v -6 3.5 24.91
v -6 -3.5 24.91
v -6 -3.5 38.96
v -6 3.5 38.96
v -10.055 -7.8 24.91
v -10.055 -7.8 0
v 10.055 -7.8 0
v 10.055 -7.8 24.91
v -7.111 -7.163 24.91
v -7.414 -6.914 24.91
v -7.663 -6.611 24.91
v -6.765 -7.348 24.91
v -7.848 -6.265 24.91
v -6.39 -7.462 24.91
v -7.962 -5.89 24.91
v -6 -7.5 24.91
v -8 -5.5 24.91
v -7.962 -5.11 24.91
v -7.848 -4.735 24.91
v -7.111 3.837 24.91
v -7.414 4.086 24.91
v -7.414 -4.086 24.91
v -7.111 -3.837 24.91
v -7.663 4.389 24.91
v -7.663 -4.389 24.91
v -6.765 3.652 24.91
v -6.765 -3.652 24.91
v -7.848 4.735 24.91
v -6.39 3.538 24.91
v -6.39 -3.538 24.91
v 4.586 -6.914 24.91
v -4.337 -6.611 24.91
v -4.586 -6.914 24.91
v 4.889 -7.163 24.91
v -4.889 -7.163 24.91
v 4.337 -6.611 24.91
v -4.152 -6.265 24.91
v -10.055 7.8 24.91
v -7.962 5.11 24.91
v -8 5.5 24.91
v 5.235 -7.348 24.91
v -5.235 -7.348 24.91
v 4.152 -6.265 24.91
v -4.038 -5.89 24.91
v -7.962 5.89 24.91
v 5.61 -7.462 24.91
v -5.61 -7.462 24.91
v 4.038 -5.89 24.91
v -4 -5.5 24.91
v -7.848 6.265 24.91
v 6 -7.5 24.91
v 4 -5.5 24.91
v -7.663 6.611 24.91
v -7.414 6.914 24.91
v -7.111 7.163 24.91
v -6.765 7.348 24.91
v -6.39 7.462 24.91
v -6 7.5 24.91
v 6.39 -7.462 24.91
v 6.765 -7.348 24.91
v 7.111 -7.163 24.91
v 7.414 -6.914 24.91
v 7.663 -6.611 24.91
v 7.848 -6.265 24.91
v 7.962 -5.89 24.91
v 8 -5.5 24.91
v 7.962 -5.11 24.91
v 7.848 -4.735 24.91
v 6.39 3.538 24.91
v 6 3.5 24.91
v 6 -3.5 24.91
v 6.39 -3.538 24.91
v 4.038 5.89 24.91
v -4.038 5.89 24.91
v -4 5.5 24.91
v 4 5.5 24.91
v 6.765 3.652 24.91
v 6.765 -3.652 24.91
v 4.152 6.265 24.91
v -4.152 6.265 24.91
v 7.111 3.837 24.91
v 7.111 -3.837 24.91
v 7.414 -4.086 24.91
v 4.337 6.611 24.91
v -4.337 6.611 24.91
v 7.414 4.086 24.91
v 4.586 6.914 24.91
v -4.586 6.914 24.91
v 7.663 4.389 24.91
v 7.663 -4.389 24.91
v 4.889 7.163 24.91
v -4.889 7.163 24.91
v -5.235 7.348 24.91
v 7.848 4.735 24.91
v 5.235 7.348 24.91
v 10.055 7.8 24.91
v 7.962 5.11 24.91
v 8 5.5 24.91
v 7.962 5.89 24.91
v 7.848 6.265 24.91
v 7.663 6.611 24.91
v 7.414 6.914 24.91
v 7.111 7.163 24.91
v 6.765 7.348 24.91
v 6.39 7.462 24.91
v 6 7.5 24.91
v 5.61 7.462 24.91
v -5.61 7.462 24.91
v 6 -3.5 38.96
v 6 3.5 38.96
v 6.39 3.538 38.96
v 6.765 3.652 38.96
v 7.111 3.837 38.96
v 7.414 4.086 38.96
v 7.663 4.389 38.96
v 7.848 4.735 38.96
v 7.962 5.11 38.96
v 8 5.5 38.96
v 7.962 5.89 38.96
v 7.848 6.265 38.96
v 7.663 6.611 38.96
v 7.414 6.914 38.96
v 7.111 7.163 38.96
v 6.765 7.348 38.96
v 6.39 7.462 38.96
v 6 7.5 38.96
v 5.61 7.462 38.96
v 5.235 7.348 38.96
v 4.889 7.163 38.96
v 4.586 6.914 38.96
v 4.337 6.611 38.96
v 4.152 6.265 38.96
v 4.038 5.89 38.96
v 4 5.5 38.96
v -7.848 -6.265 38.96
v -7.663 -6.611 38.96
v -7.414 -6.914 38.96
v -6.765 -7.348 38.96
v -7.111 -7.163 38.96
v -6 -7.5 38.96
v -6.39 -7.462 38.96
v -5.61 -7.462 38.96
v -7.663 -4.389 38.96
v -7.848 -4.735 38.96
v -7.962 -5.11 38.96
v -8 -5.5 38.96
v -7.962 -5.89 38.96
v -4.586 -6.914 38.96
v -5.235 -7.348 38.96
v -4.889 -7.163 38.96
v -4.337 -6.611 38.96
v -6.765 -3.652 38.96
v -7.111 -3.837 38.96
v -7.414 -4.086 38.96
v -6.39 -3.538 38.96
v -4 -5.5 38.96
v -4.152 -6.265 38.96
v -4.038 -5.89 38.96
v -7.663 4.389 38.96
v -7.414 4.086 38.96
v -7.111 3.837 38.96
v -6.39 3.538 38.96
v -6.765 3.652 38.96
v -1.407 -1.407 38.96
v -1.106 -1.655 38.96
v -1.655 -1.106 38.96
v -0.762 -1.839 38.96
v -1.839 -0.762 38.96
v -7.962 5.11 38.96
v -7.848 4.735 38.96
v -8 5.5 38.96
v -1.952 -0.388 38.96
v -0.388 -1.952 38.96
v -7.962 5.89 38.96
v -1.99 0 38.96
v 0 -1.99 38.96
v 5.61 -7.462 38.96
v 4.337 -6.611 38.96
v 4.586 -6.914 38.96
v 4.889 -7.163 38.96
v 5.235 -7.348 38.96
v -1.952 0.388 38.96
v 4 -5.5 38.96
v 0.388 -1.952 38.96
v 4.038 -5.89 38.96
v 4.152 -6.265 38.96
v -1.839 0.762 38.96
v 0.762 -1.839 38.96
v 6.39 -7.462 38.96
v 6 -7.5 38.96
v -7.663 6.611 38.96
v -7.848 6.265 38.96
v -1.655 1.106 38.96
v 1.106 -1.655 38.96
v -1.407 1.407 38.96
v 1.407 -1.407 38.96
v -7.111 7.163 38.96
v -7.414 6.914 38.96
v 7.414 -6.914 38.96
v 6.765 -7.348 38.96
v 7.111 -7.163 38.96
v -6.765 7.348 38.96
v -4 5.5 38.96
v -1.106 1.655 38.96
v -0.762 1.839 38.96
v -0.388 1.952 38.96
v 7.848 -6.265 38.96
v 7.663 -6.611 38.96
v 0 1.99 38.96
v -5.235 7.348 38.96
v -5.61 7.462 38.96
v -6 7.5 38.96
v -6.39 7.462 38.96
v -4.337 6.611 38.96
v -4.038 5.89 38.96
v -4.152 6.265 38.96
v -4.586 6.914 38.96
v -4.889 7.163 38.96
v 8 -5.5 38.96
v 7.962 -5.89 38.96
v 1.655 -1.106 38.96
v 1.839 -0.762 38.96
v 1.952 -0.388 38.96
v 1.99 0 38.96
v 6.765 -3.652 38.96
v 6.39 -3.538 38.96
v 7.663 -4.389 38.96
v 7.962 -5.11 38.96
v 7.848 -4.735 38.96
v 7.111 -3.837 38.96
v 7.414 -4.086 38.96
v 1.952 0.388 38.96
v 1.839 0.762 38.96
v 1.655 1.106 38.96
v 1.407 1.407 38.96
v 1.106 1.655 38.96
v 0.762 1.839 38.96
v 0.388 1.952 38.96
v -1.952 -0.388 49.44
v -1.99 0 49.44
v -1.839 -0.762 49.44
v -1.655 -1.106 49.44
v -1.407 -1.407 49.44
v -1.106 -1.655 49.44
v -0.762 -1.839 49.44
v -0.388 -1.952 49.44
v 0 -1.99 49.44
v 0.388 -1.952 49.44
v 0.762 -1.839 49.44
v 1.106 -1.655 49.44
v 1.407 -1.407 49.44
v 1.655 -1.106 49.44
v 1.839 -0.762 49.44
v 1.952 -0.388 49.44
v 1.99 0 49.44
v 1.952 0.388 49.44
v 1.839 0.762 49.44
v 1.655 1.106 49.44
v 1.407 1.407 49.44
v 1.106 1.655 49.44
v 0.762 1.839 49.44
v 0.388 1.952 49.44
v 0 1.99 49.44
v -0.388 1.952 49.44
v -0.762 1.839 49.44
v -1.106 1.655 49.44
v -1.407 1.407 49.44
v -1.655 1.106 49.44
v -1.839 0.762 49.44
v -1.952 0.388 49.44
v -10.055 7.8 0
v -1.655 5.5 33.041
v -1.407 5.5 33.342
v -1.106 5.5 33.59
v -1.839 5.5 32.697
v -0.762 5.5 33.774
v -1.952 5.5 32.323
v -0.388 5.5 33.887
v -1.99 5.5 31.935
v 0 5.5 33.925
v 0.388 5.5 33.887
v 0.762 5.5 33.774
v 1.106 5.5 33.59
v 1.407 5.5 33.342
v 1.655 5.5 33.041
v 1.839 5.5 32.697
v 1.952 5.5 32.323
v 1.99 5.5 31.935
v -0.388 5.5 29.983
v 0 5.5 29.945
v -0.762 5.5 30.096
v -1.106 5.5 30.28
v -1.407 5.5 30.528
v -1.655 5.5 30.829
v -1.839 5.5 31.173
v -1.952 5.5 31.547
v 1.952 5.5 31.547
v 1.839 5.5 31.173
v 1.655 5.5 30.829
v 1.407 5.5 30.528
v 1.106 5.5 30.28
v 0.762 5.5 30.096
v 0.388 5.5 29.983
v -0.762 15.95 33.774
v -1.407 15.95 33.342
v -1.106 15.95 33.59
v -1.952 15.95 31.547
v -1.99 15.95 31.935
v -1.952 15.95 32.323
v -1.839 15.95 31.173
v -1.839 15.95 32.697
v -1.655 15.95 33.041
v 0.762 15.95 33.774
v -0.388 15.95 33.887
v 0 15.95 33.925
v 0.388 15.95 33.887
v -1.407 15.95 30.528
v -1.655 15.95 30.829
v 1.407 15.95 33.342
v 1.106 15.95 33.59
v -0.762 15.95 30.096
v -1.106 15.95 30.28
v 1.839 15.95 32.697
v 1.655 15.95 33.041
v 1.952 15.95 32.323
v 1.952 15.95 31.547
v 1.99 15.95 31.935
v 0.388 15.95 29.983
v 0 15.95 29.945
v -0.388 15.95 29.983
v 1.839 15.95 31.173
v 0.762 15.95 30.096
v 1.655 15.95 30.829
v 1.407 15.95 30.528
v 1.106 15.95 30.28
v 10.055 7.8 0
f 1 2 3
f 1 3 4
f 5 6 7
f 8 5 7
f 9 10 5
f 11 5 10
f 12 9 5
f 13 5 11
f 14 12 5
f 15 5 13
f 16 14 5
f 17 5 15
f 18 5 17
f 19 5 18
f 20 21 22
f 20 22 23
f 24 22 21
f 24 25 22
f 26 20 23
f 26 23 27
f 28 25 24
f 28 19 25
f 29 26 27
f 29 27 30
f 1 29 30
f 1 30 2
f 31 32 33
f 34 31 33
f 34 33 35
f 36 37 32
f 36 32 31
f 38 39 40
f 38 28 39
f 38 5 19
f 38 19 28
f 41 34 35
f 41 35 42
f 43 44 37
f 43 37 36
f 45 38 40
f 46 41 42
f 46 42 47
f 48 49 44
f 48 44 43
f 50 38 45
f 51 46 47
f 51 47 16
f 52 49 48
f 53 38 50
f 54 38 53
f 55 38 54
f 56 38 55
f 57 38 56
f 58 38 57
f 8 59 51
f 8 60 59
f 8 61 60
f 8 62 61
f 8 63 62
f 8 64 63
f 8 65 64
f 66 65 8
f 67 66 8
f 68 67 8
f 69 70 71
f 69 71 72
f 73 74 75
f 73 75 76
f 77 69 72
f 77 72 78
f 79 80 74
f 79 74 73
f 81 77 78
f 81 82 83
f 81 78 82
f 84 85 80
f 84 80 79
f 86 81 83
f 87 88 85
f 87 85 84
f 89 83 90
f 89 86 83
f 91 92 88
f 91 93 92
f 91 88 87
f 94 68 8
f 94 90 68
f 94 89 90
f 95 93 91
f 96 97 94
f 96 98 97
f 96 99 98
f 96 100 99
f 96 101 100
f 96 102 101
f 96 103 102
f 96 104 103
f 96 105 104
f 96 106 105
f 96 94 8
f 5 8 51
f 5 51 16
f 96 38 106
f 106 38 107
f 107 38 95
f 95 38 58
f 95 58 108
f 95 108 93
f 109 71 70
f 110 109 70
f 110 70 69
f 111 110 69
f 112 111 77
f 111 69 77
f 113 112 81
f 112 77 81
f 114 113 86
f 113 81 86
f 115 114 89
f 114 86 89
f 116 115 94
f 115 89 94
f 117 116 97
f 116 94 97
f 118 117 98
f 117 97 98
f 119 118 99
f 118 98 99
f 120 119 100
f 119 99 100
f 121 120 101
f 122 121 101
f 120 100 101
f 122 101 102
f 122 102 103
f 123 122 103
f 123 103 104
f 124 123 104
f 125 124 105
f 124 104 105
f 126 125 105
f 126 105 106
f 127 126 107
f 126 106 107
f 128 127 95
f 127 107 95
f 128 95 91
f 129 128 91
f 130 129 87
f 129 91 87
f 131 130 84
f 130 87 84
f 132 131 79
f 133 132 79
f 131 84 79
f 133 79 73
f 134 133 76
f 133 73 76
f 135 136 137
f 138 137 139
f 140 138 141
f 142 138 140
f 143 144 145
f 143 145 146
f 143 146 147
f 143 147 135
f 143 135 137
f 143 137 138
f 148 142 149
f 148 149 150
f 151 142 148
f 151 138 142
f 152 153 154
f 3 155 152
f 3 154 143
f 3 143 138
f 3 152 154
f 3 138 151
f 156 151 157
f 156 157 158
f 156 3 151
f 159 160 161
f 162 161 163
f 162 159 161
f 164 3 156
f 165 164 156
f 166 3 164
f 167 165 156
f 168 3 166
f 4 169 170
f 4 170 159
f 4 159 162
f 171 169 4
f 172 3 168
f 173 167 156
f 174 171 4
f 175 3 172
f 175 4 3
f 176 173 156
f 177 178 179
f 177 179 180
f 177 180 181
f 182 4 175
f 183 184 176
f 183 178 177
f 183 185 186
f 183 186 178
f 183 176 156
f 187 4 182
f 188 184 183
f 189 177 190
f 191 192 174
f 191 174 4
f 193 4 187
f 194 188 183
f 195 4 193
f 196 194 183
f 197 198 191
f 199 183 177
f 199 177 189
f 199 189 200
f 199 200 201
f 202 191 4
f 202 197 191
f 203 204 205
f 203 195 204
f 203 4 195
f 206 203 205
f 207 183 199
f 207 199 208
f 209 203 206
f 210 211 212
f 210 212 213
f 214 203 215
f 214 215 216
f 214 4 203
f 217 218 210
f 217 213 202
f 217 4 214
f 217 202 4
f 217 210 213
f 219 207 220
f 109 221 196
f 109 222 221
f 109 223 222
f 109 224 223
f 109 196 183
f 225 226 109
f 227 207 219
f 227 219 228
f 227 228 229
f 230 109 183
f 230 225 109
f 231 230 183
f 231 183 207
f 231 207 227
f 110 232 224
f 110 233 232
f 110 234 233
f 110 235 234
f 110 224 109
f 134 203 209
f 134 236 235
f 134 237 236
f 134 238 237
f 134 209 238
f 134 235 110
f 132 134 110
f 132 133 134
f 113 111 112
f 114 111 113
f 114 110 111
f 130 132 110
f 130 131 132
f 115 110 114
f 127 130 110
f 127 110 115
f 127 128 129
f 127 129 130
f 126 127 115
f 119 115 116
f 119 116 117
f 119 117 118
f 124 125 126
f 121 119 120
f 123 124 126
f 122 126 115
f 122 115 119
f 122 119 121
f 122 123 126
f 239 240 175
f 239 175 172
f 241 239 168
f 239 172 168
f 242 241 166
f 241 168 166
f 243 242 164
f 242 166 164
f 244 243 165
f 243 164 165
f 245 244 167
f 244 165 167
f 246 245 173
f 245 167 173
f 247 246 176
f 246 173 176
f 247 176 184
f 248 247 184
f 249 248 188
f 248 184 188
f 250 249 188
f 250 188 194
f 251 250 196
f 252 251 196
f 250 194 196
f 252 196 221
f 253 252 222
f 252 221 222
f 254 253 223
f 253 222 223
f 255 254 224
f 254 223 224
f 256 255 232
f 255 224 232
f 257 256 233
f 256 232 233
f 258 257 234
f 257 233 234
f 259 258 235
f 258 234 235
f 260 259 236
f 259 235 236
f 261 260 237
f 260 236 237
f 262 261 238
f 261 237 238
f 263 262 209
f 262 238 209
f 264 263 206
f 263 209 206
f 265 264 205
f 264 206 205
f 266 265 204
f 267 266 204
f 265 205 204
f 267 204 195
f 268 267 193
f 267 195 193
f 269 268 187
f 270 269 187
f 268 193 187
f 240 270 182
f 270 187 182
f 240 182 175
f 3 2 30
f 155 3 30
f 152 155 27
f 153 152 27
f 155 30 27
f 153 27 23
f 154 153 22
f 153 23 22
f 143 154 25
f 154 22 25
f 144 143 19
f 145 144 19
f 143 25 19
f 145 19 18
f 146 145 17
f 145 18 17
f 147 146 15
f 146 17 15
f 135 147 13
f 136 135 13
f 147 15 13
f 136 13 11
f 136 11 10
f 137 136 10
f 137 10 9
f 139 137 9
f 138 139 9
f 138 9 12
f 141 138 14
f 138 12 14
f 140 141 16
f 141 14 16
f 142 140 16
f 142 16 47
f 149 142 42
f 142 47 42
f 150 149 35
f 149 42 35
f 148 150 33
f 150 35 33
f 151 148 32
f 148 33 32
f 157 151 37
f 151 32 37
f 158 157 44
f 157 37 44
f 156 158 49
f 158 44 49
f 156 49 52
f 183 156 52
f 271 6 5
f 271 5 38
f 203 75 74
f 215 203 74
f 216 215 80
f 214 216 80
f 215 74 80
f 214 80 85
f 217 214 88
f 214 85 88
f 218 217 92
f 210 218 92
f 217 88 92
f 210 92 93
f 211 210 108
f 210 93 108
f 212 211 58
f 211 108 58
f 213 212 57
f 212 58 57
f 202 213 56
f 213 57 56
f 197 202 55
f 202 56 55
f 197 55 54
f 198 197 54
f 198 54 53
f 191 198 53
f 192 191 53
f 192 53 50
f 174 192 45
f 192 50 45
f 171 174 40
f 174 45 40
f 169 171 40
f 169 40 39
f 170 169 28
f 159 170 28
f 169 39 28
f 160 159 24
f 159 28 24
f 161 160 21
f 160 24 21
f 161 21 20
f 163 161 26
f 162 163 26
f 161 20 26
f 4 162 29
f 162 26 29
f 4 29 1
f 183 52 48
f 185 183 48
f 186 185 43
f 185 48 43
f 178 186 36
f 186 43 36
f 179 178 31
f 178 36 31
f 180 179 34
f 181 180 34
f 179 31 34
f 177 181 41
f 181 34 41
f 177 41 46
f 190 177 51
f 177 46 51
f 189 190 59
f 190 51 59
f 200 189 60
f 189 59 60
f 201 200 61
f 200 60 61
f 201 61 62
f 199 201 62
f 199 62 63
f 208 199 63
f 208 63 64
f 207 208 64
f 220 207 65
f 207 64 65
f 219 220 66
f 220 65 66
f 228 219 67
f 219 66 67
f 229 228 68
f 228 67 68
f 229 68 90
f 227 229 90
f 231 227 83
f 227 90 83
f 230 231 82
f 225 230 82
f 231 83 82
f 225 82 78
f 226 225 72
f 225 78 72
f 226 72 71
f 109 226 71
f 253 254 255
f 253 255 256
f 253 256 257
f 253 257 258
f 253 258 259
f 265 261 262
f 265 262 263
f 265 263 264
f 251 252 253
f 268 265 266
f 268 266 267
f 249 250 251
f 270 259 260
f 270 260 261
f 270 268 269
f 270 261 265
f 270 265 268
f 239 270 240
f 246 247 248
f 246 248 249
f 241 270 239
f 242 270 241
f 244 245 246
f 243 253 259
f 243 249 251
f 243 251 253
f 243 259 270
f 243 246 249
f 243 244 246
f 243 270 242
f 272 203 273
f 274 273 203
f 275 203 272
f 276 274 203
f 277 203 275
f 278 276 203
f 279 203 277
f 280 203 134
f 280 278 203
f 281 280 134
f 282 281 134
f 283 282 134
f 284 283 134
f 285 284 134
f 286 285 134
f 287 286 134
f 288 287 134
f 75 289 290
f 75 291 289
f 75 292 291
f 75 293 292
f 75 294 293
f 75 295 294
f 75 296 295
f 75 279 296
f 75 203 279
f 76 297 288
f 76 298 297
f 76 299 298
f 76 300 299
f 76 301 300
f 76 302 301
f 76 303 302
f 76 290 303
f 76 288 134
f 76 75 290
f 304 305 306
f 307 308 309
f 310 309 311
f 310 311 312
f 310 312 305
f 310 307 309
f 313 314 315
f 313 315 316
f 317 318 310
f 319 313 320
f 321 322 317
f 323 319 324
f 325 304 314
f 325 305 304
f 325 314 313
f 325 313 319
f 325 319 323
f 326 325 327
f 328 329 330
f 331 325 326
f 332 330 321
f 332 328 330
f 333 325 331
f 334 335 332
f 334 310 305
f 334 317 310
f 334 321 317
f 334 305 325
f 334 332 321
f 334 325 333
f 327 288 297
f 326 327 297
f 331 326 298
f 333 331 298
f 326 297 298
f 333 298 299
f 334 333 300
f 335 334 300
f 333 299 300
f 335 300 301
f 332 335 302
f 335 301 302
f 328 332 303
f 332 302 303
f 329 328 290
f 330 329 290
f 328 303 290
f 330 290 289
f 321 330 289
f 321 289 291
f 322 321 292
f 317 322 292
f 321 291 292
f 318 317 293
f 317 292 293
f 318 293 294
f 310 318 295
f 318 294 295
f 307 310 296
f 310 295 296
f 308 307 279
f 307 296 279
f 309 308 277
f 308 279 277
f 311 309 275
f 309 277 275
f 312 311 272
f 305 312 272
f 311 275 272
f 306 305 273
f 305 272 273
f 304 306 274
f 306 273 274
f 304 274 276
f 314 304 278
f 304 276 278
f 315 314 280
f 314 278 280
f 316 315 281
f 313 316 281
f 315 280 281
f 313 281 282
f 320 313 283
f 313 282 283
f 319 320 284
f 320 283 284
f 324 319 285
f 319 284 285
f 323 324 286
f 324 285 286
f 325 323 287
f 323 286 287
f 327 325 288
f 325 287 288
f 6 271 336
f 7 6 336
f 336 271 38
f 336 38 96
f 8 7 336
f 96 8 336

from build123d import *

# Parameters (mm, degrees)
SKETCH1_W           = 20.11
SKETCH1_H           = 15.6
BOSS_EXTRUDE1_DEPTH = 24.91
SKETCH2_R           = 2
SKETCH2_W           = 12
SKETCH2_H           = 11
BOSS_EXTRUDE2_DEPTH = 14.05
SKETCH3_R           = 1.99
BOSS_EXTRUDE3_DEPTH = 10.45
SKETCH4_R           = 1.99
BOSS_EXTRUDE4_DEPTH = 10.48


with BuildPart() as part:
    # Sketch1 → Boss-Extrude1 (new body)
    with BuildSketch(Plane.XY):
        Rectangle(SKETCH1_W, SKETCH1_H)
    extrude(amount=BOSS_EXTRUDE1_DEPTH)

    # Sketch2 → Boss-Extrude2 (add)
    with BuildSketch(Plane.XY.offset(24.91)):
        with BuildLine():
            ThreePointArc((-4, 5.5), (-7.414213562, 6.914213562), (-6, 3.5))
            Line((-6, 3.5), (-6, 5.5))
            Line((-6, 5.5), (-4, 5.5))
        make_face()
        with BuildLine():
            Line((-6, 5.5), (-6, 3.5))
            ThreePointArc((-6, 3.5), (-4.585786438, 4.085786438), (-4, 5.5))
            Line((-4, 5.5), (-6, 5.5))
        make_face()
        with Locations((-6, -5.5)):
            Circle(SKETCH2_R)
        with Locations((6, -5.5)):
            Circle(SKETCH2_R)
        with Locations((6, 5.5)):
            Circle(SKETCH2_R)
        with Locations((-6, 5.5)):
            Circle(SKETCH2_R)
        Rectangle(SKETCH2_W, SKETCH2_H)
        with BuildLine():
            ThreePointArc((4, 5.5), (4.585786438, 4.085786438), (6, 3.5))
            Line((6, 3.5), (6, 5.5))
            Line((6, 5.5), (4, 5.5))
        make_face()
        with BuildLine():
            Line((6, 5.5), (6, 3.5))
            ThreePointArc((6, 3.5), (7.414213562, 4.085786438), (8, 5.5))
            ThreePointArc((8, 5.5), (6, 7.5), (4, 5.5))
            Line((4, 5.5), (6, 5.5))
        make_face()
        with BuildLine():
            ThreePointArc((6, -3.5), (4.585786438, -4.085786438), (4, -5.5))
            Line((4, -5.5), (6, -5.5))
            Line((6, -5.5), (6, -3.5))
        make_face()
        with BuildLine():
            Line((6, -5.5), (4, -5.5))
            ThreePointArc((4, -5.5), (6, -7.5), (8, -5.5))
            ThreePointArc((8, -5.5), (7.414213562, -4.085786438), (6, -3.5))
            Line((6, -3.5), (6, -5.5))
        make_face()
        with BuildLine():
            ThreePointArc((-6, -3.5), (-7.414213562, -6.914213562), (-4, -5.5))
            Line((-4, -5.5), (-6, -5.5))
            Line((-6, -5.5), (-6, -3.5))
        make_face()
        with BuildLine():
            Line((-6, -5.5), (-4, -5.5))
            ThreePointArc((-4, -5.5), (-4.585786438, -4.085786438), (-6, -3.5))
            Line((-6, -3.5), (-6, -5.5))
        make_face()
    extrude(amount=BOSS_EXTRUDE2_DEPTH)

    # Sketch3 → Boss-Extrude3 (add)
    with BuildSketch(Plane(origin=(0, 5.5, 0), x_dir=(1, 0, 0), z_dir=(0, 1, 0))):
        with Locations((0, -31.935)):
            Circle(SKETCH3_R)
    extrude(amount=BOSS_EXTRUDE3_DEPTH)

    # Sketch4 → Boss-Extrude4 (add)
    with BuildSketch(Plane.XY.offset(38.96)):
        with Locations(Location((0, 0, 0), (0, 0, 180))):
            Circle(SKETCH4_R)
    extrude(amount=BOSS_EXTRUDE4_DEPTH)


solid = part.part
